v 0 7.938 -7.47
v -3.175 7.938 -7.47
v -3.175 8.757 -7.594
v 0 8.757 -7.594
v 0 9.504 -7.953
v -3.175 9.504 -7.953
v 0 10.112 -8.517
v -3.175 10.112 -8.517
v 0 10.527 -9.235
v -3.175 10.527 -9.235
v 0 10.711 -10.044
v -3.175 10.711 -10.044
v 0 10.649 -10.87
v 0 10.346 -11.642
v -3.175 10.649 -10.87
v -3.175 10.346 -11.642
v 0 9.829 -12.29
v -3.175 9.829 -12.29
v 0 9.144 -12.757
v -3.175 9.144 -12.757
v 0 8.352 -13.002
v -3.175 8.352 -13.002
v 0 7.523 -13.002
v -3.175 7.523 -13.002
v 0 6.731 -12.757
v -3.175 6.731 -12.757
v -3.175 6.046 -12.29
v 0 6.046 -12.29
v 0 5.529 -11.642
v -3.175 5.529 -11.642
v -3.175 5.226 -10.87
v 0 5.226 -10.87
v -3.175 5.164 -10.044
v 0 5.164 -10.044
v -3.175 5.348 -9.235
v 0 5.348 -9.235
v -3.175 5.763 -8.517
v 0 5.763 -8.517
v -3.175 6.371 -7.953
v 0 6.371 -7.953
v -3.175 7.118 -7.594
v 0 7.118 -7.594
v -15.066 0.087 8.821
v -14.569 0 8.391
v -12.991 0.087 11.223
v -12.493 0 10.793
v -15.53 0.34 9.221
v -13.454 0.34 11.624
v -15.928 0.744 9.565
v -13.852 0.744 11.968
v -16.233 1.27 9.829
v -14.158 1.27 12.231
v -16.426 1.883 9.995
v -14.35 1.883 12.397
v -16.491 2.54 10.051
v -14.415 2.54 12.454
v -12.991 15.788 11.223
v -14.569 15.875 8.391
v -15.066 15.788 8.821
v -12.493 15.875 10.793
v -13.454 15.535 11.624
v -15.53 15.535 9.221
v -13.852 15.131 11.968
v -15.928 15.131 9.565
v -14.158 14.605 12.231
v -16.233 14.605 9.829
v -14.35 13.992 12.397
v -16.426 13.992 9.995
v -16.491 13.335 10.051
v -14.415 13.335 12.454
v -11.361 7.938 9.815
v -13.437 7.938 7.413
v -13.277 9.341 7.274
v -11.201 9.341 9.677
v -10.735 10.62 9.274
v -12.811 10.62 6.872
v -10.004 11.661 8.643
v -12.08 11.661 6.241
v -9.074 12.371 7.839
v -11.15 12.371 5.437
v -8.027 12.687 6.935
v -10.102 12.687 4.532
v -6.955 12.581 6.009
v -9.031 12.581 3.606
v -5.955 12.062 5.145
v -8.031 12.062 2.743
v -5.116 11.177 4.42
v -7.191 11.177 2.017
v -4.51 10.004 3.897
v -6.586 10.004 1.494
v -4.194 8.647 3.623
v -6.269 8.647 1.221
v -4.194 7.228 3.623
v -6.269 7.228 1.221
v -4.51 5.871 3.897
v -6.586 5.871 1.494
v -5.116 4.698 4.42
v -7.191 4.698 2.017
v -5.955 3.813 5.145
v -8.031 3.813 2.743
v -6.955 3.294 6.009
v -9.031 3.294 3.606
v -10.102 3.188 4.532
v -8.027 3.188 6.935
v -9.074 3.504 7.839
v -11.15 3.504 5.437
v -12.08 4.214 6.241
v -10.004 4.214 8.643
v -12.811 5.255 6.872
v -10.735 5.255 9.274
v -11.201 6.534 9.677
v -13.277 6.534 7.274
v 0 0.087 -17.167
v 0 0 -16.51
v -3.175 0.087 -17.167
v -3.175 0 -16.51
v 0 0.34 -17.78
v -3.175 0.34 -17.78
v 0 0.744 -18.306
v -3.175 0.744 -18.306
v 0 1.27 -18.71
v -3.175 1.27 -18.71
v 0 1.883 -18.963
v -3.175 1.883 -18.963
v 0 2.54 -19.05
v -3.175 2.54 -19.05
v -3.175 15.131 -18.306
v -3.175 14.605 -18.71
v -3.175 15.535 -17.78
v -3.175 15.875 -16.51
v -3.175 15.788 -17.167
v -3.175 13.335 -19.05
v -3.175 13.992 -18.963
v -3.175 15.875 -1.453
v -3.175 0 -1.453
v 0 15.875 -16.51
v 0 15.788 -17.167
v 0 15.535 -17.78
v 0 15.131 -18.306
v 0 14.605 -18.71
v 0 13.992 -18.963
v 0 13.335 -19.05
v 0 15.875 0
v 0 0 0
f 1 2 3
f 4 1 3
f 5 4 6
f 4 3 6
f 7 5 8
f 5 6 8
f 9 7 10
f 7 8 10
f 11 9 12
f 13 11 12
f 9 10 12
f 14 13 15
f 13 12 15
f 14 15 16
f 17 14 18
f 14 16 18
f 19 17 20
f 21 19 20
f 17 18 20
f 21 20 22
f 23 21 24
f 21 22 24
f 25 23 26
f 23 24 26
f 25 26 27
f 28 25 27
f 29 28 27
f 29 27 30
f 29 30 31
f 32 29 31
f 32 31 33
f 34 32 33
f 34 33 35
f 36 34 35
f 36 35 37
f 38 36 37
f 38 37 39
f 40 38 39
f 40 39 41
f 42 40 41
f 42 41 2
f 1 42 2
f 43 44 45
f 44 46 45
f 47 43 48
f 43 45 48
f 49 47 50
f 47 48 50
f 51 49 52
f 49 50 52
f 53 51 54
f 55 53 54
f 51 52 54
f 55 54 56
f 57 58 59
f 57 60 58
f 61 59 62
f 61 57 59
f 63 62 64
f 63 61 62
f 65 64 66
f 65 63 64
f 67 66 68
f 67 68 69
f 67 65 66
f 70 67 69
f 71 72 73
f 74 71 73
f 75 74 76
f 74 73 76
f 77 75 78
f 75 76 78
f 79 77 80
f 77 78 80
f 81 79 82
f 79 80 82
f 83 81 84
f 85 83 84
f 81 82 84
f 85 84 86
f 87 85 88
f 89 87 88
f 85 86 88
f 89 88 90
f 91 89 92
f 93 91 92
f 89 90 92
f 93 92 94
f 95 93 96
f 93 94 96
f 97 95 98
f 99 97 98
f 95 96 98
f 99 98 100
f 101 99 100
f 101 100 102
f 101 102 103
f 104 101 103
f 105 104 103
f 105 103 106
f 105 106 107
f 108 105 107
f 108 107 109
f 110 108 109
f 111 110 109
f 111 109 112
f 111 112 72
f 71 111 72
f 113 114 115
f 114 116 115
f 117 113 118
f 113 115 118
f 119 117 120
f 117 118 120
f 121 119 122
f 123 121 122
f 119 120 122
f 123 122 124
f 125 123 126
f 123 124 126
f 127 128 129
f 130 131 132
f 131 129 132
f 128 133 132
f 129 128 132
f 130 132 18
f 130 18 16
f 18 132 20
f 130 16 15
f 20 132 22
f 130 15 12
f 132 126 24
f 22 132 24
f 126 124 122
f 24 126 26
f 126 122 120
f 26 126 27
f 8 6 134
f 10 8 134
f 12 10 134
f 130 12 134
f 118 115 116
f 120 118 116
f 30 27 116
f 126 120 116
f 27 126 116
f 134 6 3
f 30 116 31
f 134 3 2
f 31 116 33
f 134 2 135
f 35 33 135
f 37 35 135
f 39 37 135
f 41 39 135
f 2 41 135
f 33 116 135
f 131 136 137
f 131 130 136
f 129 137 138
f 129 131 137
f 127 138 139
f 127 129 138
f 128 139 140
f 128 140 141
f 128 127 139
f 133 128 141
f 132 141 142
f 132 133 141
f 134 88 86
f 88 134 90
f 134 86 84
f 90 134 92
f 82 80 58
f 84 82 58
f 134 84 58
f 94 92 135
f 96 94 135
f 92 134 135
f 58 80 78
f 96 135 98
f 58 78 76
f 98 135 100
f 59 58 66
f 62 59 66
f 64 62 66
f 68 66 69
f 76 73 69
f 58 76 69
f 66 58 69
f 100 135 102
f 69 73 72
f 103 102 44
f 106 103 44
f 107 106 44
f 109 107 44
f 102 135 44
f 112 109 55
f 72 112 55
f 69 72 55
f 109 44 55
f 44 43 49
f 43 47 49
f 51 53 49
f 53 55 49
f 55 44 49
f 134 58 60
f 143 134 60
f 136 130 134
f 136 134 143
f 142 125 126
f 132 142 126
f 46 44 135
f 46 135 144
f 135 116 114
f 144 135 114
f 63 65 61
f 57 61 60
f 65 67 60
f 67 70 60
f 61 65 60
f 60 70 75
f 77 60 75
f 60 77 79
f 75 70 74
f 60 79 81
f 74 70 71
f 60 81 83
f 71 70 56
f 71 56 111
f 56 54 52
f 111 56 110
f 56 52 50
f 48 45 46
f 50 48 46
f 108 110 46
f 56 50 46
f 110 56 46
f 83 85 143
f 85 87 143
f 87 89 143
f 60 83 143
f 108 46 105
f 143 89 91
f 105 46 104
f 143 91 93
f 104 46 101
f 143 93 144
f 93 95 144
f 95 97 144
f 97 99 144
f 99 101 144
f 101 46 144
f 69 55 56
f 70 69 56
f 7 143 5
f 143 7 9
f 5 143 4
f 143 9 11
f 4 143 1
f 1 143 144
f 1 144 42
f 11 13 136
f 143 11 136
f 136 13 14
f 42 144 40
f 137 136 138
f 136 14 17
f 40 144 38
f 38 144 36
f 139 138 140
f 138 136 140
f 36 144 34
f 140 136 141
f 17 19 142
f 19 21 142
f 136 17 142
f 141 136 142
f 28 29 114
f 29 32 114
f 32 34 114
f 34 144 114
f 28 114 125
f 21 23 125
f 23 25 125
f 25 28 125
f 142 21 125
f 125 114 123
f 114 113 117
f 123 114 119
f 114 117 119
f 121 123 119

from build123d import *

# Parameters (mm, degrees)
BOSS_EXTRUDE1_DEPTH = 15.875
SKETCH3_R           = 2.7813
CUT_EXTRUDE1_DEPTH  = 29.146650548
SKETCH4_R           = 4.7625
CUT_EXTRUDE2_DEPTH  = 28.146916937
FILLET1_R           = 2.54


with BuildPart() as part:
    # Sketch1 → Boss-Extrude1 (new body)
    with BuildSketch(Plane(origin=(0, 0, 0), x_dir=(1, 0, 0), z_dir=(0, 1, 0))):
        Polygon((0, 0), (0, 19.05), (-3.175, 19.05), (-3.175, 1.452793819), (-16.490998351, -10.051372961), (-14.415343321, -12.453930181), align=None)
    extrude(amount=BOSS_EXTRUDE1_DEPTH)

    # Sketch3 → Cut-Extrude1 (cut, through all)
    with BuildSketch(Plane.ZY.offset(3.175)):
        with Locations((-10.25139691, 7.9375)):
            Circle(SKETCH3_R)
    extrude(amount=-CUT_EXTRUDE1_DEPTH, mode=Mode.SUBTRACT)

    # Sketch4 → Cut-Extrude2 (cut, through all)
    with BuildSketch(Plane(origin=(-2.07565503, 0, -2.40255722), x_dir=(-0.7567109354713432, 0, 0.6537496157842733), z_dir=(-0.6537496157842732, 0, -0.756710935471343))):
        with Locations((10.25139691, 7.9375)):
            Circle(SKETCH4_R)
    extrude(amount=-CUT_EXTRUDE2_DEPTH, mode=Mode.SUBTRACT)

    # Fillet1
    fillet1_edges = [part.edges().sort_by_distance(p)[0] for p in [
        (-1.5875, 15.875, -19.05),
        (-15.453170836, 15.875, 11.252651571),
        (-15.453170836, 0, 11.252651571),
        (-1.5875, 0, -19.05),
    ]]
    fillet(fillet1_edges, radius=FILLET1_R)


solid = part.part
